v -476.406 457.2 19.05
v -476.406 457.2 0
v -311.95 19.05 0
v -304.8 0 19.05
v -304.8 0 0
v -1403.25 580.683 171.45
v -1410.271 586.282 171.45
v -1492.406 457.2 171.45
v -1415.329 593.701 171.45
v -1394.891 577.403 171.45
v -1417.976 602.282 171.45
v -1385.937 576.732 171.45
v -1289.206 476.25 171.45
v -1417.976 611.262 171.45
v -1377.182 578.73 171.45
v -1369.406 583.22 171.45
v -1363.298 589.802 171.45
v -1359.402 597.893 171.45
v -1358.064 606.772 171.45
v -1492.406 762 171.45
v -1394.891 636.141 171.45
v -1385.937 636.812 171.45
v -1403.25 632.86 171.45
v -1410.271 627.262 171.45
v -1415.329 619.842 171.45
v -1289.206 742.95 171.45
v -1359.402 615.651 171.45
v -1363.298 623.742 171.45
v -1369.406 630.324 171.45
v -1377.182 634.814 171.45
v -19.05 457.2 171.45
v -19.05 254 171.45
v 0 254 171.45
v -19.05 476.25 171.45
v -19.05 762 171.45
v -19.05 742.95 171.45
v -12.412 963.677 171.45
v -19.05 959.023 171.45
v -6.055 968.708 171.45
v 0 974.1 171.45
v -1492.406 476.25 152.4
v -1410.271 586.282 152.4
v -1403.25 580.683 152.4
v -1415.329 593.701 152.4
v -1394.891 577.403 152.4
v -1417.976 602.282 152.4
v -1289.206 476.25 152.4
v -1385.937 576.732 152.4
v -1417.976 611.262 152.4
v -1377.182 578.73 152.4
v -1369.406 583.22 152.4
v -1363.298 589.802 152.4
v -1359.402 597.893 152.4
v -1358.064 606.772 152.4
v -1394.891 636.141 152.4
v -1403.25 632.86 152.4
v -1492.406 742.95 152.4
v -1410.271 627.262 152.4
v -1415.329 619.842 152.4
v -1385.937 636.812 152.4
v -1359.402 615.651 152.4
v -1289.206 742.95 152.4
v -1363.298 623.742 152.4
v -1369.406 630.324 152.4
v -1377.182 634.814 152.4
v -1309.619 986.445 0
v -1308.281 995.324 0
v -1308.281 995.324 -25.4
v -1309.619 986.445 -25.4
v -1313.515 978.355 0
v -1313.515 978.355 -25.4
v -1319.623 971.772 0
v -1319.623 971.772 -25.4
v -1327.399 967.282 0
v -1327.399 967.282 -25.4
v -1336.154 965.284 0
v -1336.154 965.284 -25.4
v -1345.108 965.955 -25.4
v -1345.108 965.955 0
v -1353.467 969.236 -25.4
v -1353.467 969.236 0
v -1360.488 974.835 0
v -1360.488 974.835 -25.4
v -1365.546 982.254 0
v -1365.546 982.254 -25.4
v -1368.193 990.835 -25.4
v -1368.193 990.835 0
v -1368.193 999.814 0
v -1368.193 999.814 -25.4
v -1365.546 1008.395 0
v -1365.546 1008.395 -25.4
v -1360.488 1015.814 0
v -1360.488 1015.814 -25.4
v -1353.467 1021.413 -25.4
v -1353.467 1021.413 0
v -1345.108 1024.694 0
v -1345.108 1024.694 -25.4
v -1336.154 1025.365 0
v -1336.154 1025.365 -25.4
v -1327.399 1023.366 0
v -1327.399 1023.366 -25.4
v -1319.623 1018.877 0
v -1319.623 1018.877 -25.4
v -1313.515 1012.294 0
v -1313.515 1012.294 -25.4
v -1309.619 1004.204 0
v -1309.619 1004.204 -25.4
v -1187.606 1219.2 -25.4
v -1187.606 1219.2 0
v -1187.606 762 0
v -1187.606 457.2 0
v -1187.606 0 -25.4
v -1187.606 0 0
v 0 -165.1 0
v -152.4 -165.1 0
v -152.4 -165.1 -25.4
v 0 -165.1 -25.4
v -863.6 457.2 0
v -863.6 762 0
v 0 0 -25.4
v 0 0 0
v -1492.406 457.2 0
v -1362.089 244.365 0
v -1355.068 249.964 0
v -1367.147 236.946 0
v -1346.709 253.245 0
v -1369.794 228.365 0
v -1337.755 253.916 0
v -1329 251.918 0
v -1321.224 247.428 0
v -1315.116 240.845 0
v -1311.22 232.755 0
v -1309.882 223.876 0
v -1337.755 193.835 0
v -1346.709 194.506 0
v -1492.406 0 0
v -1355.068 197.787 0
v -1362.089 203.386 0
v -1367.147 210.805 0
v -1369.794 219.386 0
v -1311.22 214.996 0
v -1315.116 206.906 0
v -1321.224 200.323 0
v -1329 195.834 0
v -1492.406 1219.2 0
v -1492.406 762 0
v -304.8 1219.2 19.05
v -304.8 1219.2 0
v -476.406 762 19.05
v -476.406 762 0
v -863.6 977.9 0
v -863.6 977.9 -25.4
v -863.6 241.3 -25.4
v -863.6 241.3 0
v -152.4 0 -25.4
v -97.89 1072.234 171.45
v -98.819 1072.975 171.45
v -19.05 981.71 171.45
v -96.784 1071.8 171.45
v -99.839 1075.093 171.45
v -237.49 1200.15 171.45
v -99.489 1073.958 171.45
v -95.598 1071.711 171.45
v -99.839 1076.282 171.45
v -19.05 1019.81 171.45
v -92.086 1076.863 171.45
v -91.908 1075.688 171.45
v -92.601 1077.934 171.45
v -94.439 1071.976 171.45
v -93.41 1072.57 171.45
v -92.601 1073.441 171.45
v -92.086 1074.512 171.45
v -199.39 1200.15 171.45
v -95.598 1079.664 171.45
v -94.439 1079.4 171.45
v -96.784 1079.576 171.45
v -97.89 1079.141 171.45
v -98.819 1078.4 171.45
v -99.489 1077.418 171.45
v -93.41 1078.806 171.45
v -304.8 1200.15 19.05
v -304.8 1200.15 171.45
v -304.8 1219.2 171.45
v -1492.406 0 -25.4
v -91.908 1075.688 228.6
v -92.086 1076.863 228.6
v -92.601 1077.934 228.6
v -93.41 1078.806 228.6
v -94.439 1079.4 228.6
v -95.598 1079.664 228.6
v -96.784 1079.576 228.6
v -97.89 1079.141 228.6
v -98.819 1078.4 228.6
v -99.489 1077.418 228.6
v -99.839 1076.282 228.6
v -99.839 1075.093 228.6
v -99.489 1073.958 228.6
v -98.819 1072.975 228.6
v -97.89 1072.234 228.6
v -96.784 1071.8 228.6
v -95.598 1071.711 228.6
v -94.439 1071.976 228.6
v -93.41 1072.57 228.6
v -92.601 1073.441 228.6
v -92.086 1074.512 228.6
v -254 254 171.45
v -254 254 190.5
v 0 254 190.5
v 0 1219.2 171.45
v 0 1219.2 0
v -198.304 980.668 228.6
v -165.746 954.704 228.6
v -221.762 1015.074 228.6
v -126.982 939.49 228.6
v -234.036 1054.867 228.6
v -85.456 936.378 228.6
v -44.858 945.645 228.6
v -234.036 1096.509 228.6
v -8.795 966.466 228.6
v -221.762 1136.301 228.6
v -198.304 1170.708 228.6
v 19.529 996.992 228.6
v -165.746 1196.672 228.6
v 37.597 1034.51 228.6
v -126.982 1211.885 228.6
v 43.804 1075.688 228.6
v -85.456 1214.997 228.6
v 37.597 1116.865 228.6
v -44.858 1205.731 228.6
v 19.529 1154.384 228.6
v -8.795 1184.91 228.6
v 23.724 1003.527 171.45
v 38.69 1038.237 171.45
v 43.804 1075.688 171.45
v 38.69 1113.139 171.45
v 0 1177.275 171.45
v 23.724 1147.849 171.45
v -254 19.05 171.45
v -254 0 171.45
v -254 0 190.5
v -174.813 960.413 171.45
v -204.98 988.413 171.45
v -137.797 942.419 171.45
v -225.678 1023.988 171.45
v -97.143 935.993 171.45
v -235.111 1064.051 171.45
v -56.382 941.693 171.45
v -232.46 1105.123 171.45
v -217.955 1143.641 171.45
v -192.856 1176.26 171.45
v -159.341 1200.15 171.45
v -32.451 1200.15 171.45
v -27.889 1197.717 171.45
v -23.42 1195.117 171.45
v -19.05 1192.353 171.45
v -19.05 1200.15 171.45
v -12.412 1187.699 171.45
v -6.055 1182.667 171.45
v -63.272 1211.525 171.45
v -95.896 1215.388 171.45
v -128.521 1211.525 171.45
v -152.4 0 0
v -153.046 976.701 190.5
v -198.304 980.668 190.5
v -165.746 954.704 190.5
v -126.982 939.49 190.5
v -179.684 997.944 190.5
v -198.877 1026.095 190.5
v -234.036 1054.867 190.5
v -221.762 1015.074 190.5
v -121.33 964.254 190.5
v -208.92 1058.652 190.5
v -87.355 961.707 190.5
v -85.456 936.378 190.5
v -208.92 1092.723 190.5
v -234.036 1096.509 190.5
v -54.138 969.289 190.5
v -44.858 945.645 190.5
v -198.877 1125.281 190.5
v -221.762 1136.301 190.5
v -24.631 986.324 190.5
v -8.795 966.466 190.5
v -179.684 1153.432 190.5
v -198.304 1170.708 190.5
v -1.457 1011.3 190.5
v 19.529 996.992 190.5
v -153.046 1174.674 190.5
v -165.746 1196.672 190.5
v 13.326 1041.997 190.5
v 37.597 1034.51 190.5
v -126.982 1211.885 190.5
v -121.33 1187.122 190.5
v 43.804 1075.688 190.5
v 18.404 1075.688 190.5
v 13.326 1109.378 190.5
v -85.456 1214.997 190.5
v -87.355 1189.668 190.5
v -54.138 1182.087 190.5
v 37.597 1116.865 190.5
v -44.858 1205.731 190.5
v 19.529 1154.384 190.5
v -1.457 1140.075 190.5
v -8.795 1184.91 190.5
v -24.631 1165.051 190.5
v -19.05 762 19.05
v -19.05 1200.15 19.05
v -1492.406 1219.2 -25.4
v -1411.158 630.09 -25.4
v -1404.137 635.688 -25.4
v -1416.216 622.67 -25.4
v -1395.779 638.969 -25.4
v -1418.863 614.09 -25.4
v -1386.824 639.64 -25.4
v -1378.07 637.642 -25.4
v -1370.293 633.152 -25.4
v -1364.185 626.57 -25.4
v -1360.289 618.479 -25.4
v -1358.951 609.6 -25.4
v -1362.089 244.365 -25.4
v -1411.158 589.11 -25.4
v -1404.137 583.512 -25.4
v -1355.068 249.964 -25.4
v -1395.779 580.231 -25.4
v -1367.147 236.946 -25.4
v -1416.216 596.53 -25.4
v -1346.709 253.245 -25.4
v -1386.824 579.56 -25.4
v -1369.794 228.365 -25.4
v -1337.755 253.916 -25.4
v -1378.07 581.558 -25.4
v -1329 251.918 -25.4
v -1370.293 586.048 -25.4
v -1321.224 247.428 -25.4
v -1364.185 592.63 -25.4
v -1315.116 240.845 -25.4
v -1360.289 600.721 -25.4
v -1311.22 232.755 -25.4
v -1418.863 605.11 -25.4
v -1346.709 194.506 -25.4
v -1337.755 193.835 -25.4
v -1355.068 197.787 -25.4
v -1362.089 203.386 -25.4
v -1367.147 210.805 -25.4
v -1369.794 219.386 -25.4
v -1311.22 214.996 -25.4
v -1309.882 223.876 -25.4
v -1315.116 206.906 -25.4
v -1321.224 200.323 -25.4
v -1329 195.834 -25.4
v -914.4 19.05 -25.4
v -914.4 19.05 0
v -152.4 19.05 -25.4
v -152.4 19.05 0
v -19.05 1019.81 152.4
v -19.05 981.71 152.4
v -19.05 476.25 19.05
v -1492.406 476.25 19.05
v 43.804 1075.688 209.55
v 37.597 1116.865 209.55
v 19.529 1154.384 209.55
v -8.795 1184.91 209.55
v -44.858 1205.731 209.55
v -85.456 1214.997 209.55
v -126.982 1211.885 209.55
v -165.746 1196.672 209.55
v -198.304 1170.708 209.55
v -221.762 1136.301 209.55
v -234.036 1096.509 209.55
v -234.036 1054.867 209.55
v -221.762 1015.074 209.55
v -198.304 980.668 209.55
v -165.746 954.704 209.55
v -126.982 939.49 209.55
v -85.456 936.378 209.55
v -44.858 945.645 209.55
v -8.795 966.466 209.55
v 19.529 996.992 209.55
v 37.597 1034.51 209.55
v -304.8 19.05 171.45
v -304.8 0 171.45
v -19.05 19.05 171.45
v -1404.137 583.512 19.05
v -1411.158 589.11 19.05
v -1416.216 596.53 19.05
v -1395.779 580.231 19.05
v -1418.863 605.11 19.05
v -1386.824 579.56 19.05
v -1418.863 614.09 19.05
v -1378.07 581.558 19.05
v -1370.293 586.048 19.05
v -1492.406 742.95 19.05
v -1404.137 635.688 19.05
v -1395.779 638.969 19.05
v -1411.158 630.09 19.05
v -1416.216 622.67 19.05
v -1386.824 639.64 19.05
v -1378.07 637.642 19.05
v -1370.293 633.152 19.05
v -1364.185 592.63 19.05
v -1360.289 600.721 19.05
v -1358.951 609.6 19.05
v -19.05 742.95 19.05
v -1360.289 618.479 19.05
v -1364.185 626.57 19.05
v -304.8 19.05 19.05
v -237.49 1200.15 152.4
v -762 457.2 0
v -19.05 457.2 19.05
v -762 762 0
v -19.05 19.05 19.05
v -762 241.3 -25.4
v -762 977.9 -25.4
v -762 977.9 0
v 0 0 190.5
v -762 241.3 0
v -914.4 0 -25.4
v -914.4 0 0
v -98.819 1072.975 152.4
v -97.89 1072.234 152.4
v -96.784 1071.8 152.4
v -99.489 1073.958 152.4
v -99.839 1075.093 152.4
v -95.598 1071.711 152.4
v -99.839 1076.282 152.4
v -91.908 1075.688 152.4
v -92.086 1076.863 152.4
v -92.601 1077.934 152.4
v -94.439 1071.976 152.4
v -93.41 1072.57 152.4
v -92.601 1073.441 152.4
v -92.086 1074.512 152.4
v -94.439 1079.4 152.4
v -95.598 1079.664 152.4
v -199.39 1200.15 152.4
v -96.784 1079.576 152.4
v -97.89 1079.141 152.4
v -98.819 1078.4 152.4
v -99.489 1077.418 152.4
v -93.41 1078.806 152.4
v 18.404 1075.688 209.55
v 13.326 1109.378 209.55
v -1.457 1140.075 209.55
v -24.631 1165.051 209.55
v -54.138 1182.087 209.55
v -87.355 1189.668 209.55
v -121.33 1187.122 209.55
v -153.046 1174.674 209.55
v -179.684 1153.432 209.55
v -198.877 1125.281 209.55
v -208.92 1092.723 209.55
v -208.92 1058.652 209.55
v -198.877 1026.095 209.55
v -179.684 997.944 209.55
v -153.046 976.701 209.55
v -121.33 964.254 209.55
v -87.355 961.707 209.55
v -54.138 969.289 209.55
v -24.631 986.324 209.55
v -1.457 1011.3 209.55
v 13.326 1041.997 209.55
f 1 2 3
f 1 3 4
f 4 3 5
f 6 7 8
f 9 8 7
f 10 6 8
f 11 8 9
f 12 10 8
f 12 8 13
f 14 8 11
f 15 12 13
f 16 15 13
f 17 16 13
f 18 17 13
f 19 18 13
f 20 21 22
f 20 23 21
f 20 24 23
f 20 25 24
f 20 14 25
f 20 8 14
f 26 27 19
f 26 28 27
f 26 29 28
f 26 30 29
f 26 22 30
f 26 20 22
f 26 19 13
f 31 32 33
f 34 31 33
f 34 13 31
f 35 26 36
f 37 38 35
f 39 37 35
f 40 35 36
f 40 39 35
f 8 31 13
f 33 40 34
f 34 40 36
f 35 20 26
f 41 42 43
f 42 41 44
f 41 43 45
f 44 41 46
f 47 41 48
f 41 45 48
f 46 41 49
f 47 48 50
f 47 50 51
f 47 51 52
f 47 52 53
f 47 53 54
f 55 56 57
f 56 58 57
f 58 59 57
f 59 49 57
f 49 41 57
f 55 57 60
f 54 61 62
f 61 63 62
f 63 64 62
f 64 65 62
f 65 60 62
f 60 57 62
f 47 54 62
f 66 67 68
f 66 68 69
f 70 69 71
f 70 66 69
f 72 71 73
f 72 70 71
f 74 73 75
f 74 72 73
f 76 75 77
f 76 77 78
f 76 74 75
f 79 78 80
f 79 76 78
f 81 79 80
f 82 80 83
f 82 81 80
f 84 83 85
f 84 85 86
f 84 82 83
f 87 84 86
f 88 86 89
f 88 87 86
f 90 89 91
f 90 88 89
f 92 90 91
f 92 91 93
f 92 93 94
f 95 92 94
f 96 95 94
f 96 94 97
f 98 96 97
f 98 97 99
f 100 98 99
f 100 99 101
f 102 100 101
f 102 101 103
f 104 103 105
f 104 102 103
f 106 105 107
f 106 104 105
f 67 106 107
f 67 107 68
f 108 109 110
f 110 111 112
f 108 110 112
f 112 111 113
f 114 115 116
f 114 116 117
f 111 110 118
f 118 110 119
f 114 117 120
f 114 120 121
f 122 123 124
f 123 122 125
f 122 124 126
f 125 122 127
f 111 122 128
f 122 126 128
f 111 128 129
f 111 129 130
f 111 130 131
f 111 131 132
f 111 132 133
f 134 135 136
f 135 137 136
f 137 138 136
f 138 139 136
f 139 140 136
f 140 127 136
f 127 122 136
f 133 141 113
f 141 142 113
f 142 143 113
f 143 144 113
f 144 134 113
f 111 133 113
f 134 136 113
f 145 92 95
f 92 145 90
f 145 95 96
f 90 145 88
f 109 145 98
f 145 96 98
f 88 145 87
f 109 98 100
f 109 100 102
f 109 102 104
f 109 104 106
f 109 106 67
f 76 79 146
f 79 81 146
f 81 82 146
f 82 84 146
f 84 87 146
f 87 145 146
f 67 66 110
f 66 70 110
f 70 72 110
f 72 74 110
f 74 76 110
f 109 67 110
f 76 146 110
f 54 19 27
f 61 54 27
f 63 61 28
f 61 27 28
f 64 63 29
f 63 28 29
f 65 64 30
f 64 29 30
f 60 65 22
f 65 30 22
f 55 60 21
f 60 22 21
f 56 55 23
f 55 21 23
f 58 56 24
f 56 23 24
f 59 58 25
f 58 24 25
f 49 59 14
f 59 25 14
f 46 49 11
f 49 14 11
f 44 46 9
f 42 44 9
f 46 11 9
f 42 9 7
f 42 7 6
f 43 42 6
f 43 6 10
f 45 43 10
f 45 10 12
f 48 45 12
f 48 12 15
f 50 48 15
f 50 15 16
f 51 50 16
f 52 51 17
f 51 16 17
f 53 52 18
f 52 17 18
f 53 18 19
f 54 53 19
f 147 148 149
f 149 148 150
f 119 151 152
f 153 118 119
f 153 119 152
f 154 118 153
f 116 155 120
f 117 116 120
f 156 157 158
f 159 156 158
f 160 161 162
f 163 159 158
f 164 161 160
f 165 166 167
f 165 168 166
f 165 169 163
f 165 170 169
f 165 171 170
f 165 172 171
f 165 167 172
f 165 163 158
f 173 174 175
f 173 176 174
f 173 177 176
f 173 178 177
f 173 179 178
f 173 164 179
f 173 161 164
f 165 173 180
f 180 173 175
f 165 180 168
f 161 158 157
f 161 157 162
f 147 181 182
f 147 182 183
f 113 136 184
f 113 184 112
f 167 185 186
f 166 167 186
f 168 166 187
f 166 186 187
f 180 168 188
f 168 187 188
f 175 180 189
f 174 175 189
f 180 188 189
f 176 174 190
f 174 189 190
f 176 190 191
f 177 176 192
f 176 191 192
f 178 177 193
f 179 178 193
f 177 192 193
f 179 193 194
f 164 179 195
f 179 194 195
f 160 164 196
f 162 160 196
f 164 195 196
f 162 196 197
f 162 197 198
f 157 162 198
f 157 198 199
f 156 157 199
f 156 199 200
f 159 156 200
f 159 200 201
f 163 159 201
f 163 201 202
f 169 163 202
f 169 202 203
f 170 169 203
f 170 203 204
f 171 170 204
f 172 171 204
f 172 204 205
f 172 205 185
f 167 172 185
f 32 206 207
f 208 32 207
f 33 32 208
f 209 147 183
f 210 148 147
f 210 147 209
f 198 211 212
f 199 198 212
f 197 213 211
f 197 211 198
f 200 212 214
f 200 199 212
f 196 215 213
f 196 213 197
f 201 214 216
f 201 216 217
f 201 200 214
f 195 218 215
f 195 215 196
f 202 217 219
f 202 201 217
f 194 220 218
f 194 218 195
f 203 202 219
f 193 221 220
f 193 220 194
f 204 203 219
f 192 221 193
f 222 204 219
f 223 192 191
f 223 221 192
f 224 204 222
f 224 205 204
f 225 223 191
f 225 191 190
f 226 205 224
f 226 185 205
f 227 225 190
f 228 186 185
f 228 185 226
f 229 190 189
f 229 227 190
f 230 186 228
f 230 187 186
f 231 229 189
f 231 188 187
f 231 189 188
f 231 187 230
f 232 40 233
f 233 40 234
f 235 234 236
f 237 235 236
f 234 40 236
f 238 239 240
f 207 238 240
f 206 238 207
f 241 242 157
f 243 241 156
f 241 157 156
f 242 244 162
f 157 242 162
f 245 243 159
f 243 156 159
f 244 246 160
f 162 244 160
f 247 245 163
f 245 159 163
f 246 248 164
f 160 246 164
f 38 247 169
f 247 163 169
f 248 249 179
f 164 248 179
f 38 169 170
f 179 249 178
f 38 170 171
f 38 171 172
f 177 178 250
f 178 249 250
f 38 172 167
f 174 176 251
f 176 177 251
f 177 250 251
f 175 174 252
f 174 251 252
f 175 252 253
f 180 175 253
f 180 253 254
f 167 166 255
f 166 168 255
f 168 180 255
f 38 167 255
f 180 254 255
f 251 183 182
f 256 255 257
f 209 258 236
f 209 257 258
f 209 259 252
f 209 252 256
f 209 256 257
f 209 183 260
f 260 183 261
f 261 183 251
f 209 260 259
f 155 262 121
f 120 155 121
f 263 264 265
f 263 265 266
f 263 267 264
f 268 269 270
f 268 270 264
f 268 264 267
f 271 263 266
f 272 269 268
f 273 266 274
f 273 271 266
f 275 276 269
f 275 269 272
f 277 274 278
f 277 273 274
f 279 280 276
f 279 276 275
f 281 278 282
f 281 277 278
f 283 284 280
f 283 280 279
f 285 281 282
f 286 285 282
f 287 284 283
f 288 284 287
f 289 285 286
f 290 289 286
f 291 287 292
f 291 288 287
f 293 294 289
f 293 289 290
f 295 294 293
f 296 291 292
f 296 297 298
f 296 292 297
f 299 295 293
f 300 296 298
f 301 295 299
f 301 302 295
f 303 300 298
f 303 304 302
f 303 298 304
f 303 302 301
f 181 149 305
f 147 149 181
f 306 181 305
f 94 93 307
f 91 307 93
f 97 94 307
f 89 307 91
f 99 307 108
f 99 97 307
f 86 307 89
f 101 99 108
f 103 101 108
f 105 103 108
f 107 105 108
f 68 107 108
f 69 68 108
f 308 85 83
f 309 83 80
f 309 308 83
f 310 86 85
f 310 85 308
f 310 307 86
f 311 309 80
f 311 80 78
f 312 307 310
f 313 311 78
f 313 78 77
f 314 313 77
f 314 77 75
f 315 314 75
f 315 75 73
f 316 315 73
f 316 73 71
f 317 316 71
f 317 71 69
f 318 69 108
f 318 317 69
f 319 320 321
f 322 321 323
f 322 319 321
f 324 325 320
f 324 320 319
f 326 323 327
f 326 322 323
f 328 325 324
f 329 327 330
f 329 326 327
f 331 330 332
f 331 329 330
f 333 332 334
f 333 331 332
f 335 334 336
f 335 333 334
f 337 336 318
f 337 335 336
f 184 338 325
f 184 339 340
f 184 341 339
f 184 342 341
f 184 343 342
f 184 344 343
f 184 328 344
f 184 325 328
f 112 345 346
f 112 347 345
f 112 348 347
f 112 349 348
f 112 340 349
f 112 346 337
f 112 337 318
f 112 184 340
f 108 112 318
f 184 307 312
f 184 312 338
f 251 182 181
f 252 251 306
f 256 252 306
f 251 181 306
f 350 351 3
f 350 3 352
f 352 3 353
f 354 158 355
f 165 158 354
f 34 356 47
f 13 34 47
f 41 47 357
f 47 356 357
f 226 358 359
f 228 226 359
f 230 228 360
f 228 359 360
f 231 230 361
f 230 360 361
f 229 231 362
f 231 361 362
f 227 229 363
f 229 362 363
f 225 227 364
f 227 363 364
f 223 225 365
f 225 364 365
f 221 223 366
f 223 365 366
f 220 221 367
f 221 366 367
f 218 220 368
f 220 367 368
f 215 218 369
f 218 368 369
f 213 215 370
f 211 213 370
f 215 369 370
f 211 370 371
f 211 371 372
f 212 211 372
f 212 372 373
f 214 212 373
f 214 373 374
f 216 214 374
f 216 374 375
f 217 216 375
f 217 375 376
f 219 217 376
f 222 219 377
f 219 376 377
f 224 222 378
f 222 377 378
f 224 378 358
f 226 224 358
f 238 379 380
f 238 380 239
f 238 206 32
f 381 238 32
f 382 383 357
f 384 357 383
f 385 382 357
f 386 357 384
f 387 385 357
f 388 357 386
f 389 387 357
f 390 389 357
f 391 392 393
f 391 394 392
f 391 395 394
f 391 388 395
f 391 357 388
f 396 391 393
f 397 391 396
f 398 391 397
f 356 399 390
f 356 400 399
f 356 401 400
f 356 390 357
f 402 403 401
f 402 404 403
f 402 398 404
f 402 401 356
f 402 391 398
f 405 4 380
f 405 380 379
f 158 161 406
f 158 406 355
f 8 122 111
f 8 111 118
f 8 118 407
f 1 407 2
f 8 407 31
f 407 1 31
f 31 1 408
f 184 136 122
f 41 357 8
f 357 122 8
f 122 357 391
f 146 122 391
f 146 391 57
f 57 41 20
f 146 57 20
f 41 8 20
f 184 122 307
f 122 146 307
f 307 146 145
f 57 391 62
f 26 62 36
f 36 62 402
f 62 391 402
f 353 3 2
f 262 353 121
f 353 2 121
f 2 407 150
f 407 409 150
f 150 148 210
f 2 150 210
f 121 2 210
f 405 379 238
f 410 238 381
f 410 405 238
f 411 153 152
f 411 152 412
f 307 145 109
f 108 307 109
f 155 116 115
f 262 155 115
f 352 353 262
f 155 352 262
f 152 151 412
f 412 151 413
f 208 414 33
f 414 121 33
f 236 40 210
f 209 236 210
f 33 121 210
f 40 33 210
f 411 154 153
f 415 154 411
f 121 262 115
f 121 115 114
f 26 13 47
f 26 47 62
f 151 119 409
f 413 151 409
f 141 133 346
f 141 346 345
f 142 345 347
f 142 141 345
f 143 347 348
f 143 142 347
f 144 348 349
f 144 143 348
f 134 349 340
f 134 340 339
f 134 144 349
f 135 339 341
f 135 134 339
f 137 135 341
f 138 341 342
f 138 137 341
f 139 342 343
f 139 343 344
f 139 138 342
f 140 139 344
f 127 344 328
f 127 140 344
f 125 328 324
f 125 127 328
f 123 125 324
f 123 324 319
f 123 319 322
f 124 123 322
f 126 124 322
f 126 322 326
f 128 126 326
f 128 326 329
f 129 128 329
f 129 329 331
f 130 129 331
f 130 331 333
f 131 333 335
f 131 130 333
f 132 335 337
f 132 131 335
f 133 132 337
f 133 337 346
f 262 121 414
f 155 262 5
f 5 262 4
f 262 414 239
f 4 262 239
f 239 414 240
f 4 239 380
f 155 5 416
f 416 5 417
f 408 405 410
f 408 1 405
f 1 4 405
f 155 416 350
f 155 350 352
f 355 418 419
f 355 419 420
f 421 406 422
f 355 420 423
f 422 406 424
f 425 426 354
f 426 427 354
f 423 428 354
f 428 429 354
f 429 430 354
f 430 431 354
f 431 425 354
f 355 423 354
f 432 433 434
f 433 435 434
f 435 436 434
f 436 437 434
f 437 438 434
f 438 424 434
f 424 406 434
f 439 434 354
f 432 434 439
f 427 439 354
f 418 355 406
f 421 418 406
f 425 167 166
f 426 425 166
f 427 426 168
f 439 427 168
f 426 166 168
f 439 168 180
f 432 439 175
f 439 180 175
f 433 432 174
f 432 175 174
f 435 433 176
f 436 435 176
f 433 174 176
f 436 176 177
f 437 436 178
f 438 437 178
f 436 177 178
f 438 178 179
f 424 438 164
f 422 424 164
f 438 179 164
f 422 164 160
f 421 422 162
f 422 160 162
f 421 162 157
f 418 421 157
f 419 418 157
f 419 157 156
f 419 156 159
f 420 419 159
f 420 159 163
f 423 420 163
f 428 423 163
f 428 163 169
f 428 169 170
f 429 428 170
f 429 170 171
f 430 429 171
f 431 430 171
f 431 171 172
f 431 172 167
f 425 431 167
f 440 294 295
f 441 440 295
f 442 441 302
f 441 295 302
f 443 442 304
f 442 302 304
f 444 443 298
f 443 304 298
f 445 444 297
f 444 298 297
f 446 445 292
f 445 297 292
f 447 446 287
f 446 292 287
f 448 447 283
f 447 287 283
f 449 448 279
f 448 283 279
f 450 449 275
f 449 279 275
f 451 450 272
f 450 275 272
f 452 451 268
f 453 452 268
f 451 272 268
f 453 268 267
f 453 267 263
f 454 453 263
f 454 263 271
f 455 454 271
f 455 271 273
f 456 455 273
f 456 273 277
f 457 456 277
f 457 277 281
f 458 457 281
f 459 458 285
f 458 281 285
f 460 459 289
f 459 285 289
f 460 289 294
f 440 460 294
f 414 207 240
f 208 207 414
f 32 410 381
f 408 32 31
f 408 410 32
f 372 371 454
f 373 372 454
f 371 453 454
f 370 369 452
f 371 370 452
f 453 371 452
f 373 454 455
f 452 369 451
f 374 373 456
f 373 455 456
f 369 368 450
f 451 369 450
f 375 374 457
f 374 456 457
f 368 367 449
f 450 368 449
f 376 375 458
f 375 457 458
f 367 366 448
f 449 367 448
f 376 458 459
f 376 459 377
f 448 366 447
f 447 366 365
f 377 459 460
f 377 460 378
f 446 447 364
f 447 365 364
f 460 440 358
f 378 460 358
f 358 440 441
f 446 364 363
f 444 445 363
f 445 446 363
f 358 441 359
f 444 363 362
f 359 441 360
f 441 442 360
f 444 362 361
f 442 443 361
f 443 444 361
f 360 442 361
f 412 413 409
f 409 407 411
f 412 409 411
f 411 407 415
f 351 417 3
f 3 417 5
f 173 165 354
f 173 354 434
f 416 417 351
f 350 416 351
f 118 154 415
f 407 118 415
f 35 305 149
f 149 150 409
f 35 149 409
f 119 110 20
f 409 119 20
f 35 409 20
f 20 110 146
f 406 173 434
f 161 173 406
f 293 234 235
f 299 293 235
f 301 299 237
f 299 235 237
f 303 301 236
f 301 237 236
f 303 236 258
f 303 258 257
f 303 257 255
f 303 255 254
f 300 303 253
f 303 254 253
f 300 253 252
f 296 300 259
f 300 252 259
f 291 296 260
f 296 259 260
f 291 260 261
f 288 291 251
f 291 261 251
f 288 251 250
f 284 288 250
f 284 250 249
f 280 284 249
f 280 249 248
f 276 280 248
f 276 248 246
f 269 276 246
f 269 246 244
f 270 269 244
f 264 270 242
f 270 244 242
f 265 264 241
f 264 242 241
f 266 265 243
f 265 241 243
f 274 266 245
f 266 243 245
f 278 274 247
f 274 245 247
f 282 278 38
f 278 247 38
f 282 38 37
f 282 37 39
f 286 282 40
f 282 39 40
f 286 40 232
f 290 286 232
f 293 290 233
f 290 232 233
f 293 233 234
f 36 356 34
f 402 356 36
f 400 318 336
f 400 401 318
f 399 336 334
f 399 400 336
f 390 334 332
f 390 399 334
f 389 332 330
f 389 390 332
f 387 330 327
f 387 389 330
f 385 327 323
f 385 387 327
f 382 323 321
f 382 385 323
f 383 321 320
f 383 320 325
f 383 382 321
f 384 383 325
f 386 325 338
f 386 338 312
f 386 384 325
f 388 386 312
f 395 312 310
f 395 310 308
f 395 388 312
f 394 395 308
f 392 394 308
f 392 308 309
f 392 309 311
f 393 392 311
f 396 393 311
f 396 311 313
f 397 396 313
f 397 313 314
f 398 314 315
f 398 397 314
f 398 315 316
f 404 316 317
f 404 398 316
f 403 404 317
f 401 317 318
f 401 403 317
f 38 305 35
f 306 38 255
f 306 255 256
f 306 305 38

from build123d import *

# Parameters (mm, degrees)
F0_W      = 476.4060080051
F0_H      = 19.05
F0_H_2    = 266.7
F0_W_2    = 1016
F0_R      = 30.1244
F1_DEPTH  = 19.05
F2_W      = 19.05
F2_H      = 1219.2
F3_DEPTH  = 152.4
F4_W      = 285.75
F4_H      = 19.05
F5_DEPTH  = 152.4
F7_DEPTH  = 152.4
F8_W      = 203.2
F8_H      = 266.7
F8_R      = 30.1244
F9_DEPTH  = 19.05
F11_DEPTH = 19.05
F12_R     = 139.7
F13_DEPTH = 19.05
F14_R     = 114.3
F15_DEPTH = 19.05
F16_R     = 139.7
F17_DEPTH = 19.05
F18_W     = 101.6
F18_H     = 736.6
F20_DEPTH = 25.4
F21_R     = 3.9878
F22_DEPTH = 96.52
F23_W     = 304.8
F23_H     = 457.2
F23_R     = 30.1244
F23_H_2   = 304.8
F24_DEPTH = 25.4
F25_W     = 254
F25_H     = 254
F26_DEPTH = 19.05
F28_DEPTH = 25.4
F29_W     = 152.4
F29_H     = 25.4
F30_DEPTH = 165.1


# Not quite as in the source:
# - a feature of the source that left no trace in its solid (it failed there, or was rolled back) is left out


with BuildPart() as f1:
    # F0 (on Top) → F1 (new body)
    with BuildSketch(Plane.XY):
        Polygon((-304.8, 0), (0, 0), (0, 457.2), (-476.4060080051, 457.2), align=None)
        with Locations((-238.2030040026, 466.725)):
            Rectangle(F0_W, F0_H)
        with Locations((-238.2030040026, 609.6)):
            Rectangle(F0_W, F0_H_2)
        with Locations((-984.4060080051, 466.725)):
            Rectangle(F0_W_2, F0_H)
        Polygon((-476.4060080051, 742.95), (0, 742.95), (0, 762), (0, 1219.2), (-304.8, 1219.2), (-476.4060080051, 762), align=None)
        with Locations((-984.4060080051, 609.6)):
            Rectangle(F0_W_2, F0_H_2)
        with Locations((-1389.0752792358, 609.6)):
            Circle(F0_R, mode=Mode.SUBTRACT)
        with Locations((-984.4060080051, 752.475)):
            Rectangle(F0_W_2, F0_H)
    extrude(amount=F1_DEPTH)

    # F2 (on face) → F3 (join)
    with BuildSketch(Plane.XY.offset(19.05)):
        with Locations((-9.525, 609.6)):
            Rectangle(F2_W, F2_H)
    extrude(amount=F3_DEPTH)

    # F4 (on face) → F5 (join)
    with BuildSketch(Plane.XY.offset(19.05)):
        with Locations((-161.925, 9.525)):
            Rectangle(F4_W, F4_H)
        with Locations((-161.925, 1209.675)):
            Rectangle(F4_W, F4_H)
    extrude(amount=F5_DEPTH)

    # F6 (on face) → F7 (join)
    with BuildSketch(Plane.XY.offset(19.05)):
        Polygon((-476.4060080051, 762), (-1492.4060080051, 762), (-1492.4060080051, 742.95), (-19.05, 742.95), (-19.05, 762), align=None)
        Polygon((-19.05, 476.25), (-1492.4060080051, 476.25), (-1492.4060080051, 457.2), (-476.4060080051, 457.2), (-19.05, 457.2), align=None)
    extrude(amount=F7_DEPTH)

    # F8 (on face) → F9 (join)
    with BuildSketch(Plane.XY.offset(171.45)):
        with Locations((-1390.8060080051, 609.6)):
            Rectangle(F8_W, F8_H)
        with Locations((-1388.1880044937, 606.7718267441)):
            Circle(F8_R, mode=Mode.SUBTRACT)
        Polygon((-1492.4060080051, 762), (-1492.4060080051, 742.95), (-1289.2060080051, 742.95), (-19.05, 742.95), (-19.05, 476.25), (-1289.2060080051, 476.25), (-1492.4060080051, 476.25), (-1492.4060080051, 457.2), (-19.05, 457.2), (-19.05, 19.05), (-304.8, 19.05), (-304.8, 0), (0, 0), (0, 1219.2), (-304.8, 1219.2), (-304.8, 1200.15), (-19.05, 1200.15), (-19.05, 762), align=None)
    extrude(amount=-F9_DEPTH)

    # F12 (on face) → F13 (join)
    with BuildSketch(Plane.XY.offset(171.45)):
        with Locations((-95.896191895, 1075.6877660751)):
            Circle(F12_R)
    extrude(amount=F13_DEPTH)

    # F14 (on face) → F15 (join)
    with BuildSketch(Plane.XY.offset(190.5)):
        with Locations((-95.896191895, 1075.6877660751)):
            Circle(F14_R)
    extrude(amount=F15_DEPTH)

    # F16 (on face) → F17 (join)
    with BuildSketch(Plane.XY.offset(209.55)):
        with Locations((-95.896191895, 1075.6877660751)):
            Circle(F16_R)
    extrude(amount=F17_DEPTH)

    # F18 (on face) → F20 (join)
    with BuildSketch(Plane(origin=(0, 0, 0), x_dir=(1, 0, 0), z_dir=(0, 0, -1))):
        with Locations((-812.8, -609.6)):
            Rectangle(F18_W, F18_H)
    extrude(amount=F20_DEPTH)


with BuildPart() as f11:
    # F10 (on face) → F11 (new body)
    with BuildSketch(Plane.XY.offset(171.45)):
        Polygon((-19.05, 981.71), (-19.05, 1019.81), (-199.39, 1200.15), (-237.49, 1200.15), align=None)
    extrude(amount=-F11_DEPTH)


with BuildPart() as f22_tool:
    # F21 (on face) → F22 (new body)
    with BuildSketch(Plane.XY.offset(228.6)):
        with Locations((-95.896191895, 1075.6877660751)):
            Circle(F21_R)
    extrude(amount=-F22_DEPTH)


with BuildPart() as f1_1:
    add(f1.part)

    # F22: cut by f22_tool
    add(f22_tool.part, mode=Mode.SUBTRACT)

    # F23 (on face) → F24 (join)
    with BuildSketch(Plane(origin=(0, 0, 0), x_dir=(1, 0, 0), z_dir=(0, 0, -1))):
        with Locations((-1340.0060080051, -990.6)):
            Rectangle(F23_W, F23_H)
        with Locations((-1338.4050130844, -995.3244)):
            Circle(F23_R, mode=Mode.SUBTRACT)
        with Locations((-1340.0060080051, -609.6)):
            Rectangle(F23_W, F23_H_2)
        with Locations((-1389.0752792358, -609.6)):
            Circle(F23_R, mode=Mode.SUBTRACT)
        with Locations((-1340.0060080051, -228.6)):
            Rectangle(F23_W, F23_H)
        with Locations((-1340.0060080051, -223.8756)):
            Circle(F23_R, mode=Mode.SUBTRACT)
    extrude(amount=F24_DEPTH)

    # F25 (on face) → F26 (join)
    with BuildSketch(Plane.XY.offset(171.45)):
        with Locations((-127, 127)):
            Rectangle(F25_W, F25_H)
    extrude(amount=F26_DEPTH)

    # F27 (on face) → F28 (join)
    with BuildSketch(Plane(origin=(0, 0, 0), x_dir=(1, 0, 0), z_dir=(0, 0, -1))):
        Polygon((-152.4, 0), (-304.8, 0), (-914.4, 0), (-914.4, -19.05), (-152.4, -19.05), align=None)
    extrude(amount=F28_DEPTH)


with BuildPart() as f11_1:
    add(f11.part)

    # F22: cut by f22_tool
    add(f22_tool.part, mode=Mode.SUBTRACT)


with BuildPart() as f30:
    # F29 (on face) → F30 (new body)
    with BuildSketch(Plane.XZ):
        with Locations((-76.2, -12.7)):
            Rectangle(F29_W, F29_H)
    extrude(amount=F30_DEPTH)


solid = Compound([f1_1.part, f11_1.part, f30.part])
